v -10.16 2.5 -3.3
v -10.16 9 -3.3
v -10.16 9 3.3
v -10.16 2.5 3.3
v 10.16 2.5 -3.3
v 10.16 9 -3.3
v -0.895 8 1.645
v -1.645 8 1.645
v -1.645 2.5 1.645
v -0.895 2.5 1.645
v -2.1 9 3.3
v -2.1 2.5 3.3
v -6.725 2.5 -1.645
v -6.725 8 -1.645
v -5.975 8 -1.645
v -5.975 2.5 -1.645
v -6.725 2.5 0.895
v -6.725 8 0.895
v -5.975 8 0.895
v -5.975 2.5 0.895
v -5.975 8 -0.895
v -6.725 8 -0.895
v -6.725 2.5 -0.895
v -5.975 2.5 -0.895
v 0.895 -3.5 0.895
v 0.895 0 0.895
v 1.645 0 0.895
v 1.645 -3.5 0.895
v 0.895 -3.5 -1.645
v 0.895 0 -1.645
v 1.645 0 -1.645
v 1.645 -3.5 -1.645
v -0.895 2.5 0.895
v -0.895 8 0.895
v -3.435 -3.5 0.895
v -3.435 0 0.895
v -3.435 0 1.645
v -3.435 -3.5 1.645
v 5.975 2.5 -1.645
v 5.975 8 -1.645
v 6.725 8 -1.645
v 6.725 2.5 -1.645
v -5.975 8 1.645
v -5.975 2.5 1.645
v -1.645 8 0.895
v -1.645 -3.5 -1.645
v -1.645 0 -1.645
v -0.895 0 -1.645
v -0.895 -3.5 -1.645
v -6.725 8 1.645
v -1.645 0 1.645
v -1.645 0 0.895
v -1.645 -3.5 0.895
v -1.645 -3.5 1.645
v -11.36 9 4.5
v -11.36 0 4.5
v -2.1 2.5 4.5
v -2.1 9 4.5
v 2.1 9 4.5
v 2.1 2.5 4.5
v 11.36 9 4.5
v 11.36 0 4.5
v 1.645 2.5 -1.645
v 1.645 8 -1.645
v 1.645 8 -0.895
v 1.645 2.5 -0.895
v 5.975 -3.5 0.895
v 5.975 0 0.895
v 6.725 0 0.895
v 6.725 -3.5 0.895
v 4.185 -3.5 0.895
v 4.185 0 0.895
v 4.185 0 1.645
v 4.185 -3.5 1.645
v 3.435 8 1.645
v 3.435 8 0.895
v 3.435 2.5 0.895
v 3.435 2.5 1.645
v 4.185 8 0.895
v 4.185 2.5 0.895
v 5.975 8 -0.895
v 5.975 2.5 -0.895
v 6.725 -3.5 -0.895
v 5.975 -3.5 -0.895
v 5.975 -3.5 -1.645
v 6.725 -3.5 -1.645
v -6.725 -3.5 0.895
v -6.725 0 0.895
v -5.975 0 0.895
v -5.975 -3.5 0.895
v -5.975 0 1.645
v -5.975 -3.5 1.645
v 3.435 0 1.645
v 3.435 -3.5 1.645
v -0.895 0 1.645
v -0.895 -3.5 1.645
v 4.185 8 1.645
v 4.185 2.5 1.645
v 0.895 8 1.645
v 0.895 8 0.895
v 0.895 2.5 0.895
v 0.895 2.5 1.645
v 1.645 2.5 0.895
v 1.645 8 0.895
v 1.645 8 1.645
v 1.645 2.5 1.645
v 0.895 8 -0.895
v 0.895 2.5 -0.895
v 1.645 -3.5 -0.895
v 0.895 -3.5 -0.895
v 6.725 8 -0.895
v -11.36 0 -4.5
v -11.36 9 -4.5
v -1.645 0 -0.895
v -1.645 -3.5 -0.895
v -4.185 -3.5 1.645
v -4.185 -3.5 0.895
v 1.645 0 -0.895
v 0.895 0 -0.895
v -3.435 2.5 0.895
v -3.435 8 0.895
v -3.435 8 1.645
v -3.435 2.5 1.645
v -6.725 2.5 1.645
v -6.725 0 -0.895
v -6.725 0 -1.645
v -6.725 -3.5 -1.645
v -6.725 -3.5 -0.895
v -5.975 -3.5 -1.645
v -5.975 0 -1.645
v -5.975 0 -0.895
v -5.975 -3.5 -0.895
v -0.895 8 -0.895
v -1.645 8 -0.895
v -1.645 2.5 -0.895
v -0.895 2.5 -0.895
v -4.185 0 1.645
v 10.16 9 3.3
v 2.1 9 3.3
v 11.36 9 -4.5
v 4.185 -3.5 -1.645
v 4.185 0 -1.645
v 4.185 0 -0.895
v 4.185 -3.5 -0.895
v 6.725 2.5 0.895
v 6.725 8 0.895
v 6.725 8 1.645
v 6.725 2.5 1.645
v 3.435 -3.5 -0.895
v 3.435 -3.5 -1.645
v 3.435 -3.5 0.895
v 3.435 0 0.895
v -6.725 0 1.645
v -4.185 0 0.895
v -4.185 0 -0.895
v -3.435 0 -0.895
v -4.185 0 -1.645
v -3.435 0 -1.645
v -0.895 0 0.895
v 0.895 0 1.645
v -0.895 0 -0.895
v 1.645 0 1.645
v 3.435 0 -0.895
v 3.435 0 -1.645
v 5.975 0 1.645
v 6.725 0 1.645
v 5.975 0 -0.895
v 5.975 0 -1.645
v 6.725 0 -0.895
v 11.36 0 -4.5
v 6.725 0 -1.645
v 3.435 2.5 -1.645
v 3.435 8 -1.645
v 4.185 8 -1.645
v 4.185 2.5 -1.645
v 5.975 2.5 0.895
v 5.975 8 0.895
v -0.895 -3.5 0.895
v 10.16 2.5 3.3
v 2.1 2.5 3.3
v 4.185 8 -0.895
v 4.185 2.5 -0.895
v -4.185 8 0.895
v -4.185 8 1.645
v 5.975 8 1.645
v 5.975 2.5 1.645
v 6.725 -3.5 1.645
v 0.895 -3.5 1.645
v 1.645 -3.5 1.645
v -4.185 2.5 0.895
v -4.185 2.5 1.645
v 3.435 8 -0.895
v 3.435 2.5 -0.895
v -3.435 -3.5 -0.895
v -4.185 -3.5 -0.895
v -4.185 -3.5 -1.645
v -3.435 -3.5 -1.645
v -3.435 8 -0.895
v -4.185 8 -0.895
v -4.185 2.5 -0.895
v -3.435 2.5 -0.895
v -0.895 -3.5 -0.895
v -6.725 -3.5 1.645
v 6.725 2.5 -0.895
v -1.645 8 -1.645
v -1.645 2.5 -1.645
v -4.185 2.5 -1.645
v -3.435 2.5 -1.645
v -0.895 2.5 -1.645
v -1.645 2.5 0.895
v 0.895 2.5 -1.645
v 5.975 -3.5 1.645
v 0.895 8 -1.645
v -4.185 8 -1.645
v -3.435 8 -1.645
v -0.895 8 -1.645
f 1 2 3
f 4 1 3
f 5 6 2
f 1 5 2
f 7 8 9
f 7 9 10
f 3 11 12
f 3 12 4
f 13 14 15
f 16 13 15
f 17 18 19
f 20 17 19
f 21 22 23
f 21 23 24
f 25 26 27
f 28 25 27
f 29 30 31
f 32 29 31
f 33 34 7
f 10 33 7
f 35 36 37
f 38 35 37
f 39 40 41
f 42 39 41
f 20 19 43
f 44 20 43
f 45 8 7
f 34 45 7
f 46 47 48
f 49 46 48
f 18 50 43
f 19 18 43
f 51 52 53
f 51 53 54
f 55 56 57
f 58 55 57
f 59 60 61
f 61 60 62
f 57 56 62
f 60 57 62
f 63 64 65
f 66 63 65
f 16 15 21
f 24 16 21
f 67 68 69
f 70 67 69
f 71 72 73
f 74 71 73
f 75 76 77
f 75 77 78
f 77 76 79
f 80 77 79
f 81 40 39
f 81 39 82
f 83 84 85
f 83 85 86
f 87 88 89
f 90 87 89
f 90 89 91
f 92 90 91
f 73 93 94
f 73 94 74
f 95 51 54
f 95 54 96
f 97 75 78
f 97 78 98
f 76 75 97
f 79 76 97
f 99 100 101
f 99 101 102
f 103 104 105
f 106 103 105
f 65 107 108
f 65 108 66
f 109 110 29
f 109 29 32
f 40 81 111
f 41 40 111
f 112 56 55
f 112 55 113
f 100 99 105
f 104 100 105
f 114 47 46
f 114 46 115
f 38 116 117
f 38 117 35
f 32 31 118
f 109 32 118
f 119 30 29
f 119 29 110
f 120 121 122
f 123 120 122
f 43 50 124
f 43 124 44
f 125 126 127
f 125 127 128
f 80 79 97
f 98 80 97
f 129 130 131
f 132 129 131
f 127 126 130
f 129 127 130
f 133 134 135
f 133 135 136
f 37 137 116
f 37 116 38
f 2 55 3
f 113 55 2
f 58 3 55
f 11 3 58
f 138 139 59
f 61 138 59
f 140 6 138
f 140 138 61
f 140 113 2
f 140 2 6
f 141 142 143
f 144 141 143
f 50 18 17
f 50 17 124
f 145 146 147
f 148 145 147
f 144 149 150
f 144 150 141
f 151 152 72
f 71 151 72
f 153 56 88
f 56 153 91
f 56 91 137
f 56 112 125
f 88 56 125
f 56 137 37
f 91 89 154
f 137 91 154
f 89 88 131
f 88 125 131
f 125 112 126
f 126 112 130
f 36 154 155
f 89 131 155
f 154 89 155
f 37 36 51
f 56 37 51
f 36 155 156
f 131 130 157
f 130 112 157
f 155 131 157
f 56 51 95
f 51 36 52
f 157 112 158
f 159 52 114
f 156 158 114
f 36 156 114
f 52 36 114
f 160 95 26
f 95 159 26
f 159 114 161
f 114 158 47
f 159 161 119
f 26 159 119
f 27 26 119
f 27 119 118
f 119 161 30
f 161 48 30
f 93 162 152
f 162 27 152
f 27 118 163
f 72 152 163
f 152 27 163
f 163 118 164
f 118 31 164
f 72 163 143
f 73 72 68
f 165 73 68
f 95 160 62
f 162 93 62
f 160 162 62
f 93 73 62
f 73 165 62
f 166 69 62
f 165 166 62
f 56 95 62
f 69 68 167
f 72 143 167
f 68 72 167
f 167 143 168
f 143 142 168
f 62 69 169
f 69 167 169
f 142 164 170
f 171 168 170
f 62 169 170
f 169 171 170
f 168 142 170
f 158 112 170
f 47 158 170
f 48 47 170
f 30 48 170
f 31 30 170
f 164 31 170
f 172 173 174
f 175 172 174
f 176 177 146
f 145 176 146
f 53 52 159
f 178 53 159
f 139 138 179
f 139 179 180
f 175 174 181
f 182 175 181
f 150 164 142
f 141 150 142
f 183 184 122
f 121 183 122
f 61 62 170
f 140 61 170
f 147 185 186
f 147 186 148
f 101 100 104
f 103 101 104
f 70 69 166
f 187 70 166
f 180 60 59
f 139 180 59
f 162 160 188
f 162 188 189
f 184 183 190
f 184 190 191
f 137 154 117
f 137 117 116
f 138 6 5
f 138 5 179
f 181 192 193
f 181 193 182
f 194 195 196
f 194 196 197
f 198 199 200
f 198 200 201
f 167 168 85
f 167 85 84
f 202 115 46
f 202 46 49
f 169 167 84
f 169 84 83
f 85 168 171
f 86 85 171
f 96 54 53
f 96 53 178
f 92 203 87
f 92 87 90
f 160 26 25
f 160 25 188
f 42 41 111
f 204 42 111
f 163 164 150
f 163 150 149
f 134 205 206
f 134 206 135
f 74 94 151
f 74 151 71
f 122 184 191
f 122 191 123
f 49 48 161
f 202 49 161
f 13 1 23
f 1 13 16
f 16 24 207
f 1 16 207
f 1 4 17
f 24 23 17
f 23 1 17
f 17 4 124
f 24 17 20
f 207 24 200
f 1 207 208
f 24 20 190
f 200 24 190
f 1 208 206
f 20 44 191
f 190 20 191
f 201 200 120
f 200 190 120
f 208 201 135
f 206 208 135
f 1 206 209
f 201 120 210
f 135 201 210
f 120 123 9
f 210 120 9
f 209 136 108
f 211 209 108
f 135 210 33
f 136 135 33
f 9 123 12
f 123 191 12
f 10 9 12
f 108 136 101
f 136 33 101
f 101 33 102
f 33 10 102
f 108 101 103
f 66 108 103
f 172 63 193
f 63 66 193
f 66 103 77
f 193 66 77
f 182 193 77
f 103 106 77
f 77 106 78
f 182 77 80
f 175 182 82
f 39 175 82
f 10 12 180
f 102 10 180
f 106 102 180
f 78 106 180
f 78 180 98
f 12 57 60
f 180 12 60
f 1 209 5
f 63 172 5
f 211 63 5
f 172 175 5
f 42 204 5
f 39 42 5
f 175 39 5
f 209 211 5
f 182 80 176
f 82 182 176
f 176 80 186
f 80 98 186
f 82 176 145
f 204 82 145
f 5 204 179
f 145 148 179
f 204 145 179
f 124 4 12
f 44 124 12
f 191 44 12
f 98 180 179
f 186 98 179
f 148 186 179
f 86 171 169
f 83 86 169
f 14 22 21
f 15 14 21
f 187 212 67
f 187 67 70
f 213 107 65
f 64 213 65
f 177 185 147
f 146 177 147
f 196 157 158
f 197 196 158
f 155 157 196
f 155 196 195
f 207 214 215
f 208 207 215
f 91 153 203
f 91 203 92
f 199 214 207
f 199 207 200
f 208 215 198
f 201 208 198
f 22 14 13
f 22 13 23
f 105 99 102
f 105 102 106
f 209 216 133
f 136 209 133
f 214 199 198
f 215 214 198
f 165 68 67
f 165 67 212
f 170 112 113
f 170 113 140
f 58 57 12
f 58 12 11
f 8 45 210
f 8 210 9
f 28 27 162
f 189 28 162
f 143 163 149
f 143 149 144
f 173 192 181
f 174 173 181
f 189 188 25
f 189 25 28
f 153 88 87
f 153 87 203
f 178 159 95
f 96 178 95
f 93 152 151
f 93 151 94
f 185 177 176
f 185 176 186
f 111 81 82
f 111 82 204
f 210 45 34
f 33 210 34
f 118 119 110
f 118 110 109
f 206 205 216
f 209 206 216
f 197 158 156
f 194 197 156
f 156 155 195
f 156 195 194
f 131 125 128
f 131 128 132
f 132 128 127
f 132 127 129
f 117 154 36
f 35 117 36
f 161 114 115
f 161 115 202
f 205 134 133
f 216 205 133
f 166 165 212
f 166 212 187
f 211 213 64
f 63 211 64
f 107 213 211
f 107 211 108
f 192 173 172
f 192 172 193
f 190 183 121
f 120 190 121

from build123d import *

# Parameters (mm, degrees)
SKETCH_1_W           = 22.72
SKETCH_1_H           = 9
EXTRUDE_1_DEPTH      = 9
SKETCH_2_W           = 20.32
SKETCH_2_H           = 6.6
CUT_EXTRUDE_1_DEPTH  = 6.5
SKETCH_3_W           = 4.2
SKETCH_3_H           = 6.5
CUT_EXTRUDE_2_DEPTH  = 6.5
EXTRUDE_2_DEPTH      = 3.5
EXTRUDE_2_DEPTH_BACK = 8
SKETCH_5_W           = 0.75
SKETCH_5_H           = 0.75


with BuildPart() as part:
    # 草图1 → 拉伸1 (new body)
    with BuildSketch(Plane(origin=(0, 0, 0), x_dir=(1, 0, 0), z_dir=(0, 1, 0))):
        Rectangle(SKETCH_1_W, SKETCH_1_H)
    extrude(amount=EXTRUDE_1_DEPTH)

    # 草图2 → 切除-拉伸1 (cut)
    with BuildSketch(Plane(origin=(0, 9, 0), x_dir=(-1, 0, 0), z_dir=(0, 1, 0))):
        Rectangle(SKETCH_2_W, SKETCH_2_H)
    extrude(amount=-CUT_EXTRUDE_1_DEPTH, mode=Mode.SUBTRACT)

    # 草图3 → 切除-拉伸2 (cut)
    with BuildSketch(Plane.XY.offset(4.5)):
        with Locations((0, 5.75)):
            Rectangle(SKETCH_3_W, SKETCH_3_H)
    extrude(amount=-CUT_EXTRUDE_2_DEPTH, mode=Mode.SUBTRACT)

    # 草图5 → 拉伸2 (add, two sides: drawn at the far end of the back side and taken through both)
    with BuildSketch(Plane.XZ.offset(-EXTRUDE_2_DEPTH_BACK)):
        with Locations((-1.27, 1.27)):
            Rectangle(SKETCH_5_W, SKETCH_5_H)
        with Locations((-3.81, 1.27)):
            Rectangle(SKETCH_5_W, SKETCH_5_H)
        with Locations((-6.35, 1.27)):
            Rectangle(SKETCH_5_W, SKETCH_5_H)
        with Locations((-6.35, -1.27)):
            Rectangle(SKETCH_5_W, SKETCH_5_H)
        with Locations((-3.81, -1.27)):
            Rectangle(SKETCH_5_W, SKETCH_5_H)
        with Locations((-1.27, -1.27)):
            Rectangle(SKETCH_5_W, SKETCH_5_H)
        with Locations((1.27, -1.27)):
            Rectangle(SKETCH_5_W, SKETCH_5_H)
        with Locations((3.81, -1.27)):
            Rectangle(SKETCH_5_W, SKETCH_5_H)
        with Locations((6.35, -1.27)):
            Rectangle(SKETCH_5_W, SKETCH_5_H)
        with Locations((6.35, 1.27)):
            Rectangle(SKETCH_5_W, SKETCH_5_H)
        with Locations((3.81, 1.27)):
            Rectangle(SKETCH_5_W, SKETCH_5_H)
        with Locations((1.27, 1.27)):
            Rectangle(SKETCH_5_W, SKETCH_5_H)
    extrude(amount=EXTRUDE_2_DEPTH + EXTRUDE_2_DEPTH_BACK)


solid = part.part
